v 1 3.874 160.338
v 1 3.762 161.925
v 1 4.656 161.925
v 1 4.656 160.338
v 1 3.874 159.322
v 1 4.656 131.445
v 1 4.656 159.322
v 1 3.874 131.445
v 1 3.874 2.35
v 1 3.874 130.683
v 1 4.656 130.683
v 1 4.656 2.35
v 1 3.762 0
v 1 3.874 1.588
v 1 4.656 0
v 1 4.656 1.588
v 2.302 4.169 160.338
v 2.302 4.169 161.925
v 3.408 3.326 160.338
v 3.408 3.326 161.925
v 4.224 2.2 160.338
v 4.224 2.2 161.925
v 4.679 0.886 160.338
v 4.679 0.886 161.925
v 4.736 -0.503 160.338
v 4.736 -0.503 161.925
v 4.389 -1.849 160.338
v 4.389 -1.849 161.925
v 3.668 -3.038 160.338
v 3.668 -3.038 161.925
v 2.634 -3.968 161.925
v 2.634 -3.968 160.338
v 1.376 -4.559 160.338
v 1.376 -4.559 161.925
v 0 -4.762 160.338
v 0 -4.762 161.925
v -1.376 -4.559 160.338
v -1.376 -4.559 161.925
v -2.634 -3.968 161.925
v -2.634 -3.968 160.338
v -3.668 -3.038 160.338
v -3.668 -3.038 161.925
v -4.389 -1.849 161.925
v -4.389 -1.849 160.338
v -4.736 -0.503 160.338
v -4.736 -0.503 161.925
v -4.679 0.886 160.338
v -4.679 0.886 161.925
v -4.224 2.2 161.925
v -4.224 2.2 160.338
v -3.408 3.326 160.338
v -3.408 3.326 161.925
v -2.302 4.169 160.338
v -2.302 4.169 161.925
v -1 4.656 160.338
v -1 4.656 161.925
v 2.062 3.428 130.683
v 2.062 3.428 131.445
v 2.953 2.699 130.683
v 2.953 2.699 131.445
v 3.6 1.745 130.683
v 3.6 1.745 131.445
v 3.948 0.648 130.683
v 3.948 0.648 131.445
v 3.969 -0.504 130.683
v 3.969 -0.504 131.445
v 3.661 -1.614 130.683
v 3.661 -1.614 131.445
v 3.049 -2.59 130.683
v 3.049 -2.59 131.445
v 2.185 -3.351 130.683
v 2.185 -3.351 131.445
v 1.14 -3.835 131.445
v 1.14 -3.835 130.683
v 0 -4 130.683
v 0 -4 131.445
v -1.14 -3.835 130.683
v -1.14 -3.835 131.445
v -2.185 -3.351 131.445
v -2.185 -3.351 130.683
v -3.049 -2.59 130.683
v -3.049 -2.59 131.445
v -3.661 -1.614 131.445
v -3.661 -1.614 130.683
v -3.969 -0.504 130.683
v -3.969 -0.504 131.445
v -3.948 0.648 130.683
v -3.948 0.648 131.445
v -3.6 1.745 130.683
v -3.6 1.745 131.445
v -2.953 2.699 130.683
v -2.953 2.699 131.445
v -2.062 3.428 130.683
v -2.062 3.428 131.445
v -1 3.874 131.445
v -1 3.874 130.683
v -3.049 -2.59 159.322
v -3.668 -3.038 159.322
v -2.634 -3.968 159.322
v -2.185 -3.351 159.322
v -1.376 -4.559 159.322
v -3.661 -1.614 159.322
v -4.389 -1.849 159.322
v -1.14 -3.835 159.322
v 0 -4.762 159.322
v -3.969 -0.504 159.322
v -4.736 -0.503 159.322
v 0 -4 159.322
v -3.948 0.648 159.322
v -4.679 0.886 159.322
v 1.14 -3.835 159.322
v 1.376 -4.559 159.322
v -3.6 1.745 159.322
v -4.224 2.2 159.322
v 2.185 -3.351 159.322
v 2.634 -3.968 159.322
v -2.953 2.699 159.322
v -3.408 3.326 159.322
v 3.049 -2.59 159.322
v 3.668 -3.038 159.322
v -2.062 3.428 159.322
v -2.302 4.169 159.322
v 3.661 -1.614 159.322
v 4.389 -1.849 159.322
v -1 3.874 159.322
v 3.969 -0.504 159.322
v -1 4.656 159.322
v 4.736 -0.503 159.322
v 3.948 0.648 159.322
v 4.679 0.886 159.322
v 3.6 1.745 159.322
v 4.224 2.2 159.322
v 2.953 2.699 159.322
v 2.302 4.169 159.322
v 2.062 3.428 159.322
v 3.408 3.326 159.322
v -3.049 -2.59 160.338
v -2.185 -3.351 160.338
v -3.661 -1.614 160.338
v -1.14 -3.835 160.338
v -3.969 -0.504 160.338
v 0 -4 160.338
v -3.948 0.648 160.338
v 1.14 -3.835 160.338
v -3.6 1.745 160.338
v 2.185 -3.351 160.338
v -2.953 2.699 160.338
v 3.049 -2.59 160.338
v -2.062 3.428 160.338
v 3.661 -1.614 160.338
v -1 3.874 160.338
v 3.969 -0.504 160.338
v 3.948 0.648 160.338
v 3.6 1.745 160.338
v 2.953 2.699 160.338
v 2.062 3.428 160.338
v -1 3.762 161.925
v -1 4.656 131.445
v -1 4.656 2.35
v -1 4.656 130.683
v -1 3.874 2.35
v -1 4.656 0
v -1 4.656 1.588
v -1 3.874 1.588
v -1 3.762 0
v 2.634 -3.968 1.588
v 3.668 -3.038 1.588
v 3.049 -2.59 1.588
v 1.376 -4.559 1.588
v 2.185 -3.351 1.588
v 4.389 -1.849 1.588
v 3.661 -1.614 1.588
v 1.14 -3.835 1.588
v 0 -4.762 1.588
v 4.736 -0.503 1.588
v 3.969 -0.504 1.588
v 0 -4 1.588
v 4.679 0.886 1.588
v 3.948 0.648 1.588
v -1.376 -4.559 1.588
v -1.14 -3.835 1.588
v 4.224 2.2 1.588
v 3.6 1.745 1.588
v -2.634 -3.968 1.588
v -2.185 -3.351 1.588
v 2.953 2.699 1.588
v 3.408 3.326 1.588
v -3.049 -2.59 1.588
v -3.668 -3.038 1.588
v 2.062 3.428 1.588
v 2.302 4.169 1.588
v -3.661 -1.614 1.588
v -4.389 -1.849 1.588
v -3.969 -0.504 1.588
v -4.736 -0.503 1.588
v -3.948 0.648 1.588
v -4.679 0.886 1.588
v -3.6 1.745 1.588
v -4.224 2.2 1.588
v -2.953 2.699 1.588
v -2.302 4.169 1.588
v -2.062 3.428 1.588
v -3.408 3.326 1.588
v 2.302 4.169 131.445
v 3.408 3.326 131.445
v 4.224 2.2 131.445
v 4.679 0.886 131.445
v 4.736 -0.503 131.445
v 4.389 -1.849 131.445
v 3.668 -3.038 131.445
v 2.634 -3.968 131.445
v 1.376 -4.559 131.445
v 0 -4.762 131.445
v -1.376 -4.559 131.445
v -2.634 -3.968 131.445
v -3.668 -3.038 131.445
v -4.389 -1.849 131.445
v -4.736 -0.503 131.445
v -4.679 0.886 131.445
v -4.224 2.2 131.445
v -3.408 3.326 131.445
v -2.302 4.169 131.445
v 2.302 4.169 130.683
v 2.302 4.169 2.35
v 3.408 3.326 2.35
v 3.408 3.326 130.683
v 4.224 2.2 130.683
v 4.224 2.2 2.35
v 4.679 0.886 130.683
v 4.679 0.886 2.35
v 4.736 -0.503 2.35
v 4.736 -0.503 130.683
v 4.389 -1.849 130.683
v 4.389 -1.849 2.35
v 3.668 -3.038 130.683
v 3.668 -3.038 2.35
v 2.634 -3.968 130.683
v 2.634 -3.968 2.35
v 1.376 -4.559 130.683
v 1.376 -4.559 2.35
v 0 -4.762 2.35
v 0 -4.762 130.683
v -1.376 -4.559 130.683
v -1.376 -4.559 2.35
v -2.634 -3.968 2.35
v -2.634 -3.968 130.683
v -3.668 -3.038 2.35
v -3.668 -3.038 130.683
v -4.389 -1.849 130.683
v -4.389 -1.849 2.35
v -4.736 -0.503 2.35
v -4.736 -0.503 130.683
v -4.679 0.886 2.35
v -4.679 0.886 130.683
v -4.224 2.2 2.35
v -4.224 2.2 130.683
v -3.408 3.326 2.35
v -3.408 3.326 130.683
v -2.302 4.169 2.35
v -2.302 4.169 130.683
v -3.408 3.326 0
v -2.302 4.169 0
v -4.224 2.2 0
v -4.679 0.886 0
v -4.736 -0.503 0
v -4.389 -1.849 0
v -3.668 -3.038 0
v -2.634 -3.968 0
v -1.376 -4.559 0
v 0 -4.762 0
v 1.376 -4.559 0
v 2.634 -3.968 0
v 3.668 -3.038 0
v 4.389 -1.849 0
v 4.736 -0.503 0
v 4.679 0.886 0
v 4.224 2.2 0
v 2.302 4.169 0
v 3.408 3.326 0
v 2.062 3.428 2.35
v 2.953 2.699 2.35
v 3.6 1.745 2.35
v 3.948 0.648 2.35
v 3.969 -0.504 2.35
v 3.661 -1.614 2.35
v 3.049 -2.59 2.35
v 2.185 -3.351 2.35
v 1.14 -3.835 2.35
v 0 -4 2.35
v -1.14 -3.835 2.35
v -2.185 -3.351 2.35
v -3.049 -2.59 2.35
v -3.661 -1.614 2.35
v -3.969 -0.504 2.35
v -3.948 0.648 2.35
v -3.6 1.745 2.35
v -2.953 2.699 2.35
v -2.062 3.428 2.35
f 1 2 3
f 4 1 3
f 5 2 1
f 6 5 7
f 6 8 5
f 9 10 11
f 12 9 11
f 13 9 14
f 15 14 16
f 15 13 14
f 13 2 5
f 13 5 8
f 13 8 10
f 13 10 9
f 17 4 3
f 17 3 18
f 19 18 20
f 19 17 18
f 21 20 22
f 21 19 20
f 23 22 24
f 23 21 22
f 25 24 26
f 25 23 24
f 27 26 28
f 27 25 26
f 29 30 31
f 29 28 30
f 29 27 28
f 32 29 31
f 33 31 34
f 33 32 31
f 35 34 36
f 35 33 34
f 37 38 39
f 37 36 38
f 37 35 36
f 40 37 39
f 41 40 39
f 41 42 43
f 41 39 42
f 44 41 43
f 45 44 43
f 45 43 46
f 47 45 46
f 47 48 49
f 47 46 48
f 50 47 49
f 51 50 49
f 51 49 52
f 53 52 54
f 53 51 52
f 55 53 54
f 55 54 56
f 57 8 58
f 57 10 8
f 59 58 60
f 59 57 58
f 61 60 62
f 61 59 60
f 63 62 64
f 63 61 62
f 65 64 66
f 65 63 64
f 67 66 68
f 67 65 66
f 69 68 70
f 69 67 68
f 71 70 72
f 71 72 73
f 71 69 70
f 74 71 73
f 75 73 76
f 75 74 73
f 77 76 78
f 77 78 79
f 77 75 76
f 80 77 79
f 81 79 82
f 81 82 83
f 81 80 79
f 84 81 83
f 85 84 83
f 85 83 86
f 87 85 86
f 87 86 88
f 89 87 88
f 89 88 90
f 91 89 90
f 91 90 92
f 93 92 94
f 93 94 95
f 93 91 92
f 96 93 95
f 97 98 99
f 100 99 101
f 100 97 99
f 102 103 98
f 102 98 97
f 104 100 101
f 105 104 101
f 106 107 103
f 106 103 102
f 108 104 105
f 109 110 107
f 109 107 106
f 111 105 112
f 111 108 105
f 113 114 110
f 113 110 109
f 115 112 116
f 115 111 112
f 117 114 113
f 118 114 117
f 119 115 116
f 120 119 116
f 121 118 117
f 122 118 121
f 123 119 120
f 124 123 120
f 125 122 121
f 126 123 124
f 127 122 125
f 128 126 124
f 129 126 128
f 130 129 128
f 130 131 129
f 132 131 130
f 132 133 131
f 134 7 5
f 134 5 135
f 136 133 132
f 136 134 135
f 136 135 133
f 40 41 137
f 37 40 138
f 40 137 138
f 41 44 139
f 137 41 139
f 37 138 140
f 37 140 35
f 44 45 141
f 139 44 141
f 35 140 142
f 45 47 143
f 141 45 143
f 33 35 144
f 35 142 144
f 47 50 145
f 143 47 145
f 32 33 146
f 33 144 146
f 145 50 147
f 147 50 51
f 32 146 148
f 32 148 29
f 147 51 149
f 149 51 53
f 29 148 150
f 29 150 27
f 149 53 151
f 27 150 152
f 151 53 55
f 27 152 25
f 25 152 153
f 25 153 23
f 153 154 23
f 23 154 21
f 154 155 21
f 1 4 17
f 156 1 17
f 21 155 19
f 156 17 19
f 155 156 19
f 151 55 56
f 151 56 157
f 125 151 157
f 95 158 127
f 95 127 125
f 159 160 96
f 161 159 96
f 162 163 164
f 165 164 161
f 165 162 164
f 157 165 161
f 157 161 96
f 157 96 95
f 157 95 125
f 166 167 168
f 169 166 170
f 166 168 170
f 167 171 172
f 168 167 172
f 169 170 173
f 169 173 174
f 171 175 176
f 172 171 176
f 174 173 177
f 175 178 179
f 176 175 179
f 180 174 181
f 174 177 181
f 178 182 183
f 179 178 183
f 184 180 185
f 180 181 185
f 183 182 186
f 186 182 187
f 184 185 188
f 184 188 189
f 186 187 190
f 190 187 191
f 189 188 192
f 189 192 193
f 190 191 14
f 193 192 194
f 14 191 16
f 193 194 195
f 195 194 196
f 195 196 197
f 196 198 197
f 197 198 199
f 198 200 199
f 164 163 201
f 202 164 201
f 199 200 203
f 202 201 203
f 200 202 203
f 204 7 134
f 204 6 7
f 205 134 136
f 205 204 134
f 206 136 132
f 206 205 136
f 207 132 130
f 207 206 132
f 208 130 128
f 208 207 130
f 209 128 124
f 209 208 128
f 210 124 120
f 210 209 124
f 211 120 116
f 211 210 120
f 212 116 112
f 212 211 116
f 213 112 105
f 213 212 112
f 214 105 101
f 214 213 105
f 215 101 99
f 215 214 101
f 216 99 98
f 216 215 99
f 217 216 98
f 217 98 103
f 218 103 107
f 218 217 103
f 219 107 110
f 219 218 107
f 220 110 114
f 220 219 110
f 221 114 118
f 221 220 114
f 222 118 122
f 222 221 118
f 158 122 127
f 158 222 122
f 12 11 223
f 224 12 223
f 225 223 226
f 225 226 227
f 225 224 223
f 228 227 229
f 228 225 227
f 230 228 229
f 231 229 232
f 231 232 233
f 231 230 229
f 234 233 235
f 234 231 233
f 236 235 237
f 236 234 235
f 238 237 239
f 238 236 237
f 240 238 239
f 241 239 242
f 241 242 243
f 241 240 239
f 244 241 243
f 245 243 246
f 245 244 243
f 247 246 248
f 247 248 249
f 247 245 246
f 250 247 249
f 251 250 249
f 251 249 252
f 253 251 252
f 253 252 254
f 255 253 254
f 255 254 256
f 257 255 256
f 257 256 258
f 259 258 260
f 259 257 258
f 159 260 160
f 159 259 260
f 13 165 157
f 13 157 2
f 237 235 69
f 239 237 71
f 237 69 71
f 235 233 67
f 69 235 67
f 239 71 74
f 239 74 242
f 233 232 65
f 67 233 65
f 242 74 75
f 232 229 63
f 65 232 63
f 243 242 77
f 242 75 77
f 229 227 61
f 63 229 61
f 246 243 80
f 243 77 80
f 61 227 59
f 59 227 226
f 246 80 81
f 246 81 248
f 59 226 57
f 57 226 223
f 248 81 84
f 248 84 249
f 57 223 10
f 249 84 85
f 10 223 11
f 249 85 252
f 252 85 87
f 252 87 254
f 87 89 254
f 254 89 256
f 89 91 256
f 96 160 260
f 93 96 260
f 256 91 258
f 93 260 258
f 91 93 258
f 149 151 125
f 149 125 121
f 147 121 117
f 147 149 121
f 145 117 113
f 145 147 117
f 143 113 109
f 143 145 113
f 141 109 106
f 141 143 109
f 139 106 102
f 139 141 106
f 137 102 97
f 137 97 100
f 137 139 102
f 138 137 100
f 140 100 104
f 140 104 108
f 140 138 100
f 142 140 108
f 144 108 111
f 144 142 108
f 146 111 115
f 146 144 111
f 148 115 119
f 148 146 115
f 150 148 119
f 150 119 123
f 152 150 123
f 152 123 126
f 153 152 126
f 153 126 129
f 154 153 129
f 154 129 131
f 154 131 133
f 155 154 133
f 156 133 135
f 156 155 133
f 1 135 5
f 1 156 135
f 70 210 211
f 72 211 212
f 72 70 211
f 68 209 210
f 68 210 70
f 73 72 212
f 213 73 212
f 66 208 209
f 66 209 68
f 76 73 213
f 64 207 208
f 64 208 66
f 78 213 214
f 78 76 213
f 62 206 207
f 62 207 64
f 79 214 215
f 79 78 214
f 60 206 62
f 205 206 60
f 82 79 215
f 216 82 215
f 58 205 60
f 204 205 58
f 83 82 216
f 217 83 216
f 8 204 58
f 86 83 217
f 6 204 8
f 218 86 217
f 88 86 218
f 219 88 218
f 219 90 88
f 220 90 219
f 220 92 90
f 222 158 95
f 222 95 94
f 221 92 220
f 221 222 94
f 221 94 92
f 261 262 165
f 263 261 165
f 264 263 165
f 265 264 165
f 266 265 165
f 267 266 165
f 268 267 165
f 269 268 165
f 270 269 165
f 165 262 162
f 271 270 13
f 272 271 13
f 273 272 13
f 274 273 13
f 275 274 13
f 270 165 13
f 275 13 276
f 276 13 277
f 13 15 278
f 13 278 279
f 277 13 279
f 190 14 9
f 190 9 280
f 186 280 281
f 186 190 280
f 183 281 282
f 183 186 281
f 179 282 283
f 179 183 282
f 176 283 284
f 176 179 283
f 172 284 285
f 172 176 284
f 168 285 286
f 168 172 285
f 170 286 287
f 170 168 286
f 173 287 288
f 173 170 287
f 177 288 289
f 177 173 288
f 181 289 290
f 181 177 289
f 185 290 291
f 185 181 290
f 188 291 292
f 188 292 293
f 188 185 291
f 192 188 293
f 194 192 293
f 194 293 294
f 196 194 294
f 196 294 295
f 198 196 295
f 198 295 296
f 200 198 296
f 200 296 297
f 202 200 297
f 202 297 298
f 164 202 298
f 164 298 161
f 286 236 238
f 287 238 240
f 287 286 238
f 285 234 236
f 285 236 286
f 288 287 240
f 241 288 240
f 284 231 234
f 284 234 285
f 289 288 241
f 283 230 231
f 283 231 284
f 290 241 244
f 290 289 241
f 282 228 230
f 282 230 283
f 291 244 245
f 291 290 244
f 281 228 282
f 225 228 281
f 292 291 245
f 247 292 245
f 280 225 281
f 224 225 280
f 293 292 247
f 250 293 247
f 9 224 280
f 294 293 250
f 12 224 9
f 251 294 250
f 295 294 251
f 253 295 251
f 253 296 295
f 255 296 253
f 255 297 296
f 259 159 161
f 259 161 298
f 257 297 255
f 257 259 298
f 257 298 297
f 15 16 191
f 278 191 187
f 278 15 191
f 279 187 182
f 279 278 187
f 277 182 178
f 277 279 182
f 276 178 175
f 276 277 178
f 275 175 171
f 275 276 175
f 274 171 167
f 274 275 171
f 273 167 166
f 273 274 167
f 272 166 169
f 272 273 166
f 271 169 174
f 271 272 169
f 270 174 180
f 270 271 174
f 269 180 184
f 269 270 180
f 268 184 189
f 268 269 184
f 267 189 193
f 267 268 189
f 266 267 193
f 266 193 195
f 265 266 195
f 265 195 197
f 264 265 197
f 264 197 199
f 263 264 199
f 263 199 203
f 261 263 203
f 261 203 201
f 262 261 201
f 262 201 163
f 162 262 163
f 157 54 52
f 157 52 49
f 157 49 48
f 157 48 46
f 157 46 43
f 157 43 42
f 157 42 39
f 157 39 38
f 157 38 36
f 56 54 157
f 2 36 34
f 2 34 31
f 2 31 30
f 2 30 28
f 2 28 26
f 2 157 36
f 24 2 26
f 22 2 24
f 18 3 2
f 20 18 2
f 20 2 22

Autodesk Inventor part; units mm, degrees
sketch "Sketch1" plane through (0, 0, 0) normal (0, 0, 1) x (1, 0, 0)
  arc A0 (-1, 4.6563) -> (1, 4.6563) centre (0, 0) ccw
  line L0 (-1, 3.7625) -> (1, 3.7625)
  line L1 (1, 3.7625) -> (1, 4.6563)
  line L2 (1, 5.7625) -> (-1, 5.7625) construction
  line L3 (-1, 5.7625) -> (-1, 4.6563) construction
  arc A1 (1, 4.6563) -> (-1, 4.6563) centre (0, 0) ccw construction
  line L4 (-1, 4.6563) -> (-1, 3.7625)
  line L5 (1, 4.6563) -> (1, 5.7625) construction
  dimension "d0" = 9.525
  dimension "d3" = 2
  dimension "d4" = 2
  dimension "d5" = 1
  dimension "d6" = 3.7625
extrude "Extrusion1" add sketch "Sketch1" along normal blind 161.925
ref_plane "Work Plane1" through (0, 0, 1.5875) normal (0, 0, -1) x (-1, 0, 0)
sketch "Sketch2" plane through (0, 0, 1.5875) normal (0, 0, -1) x (-1, 0, 0)
  line L0 (-1, 3.7625) -> (-1, 4.6563) projected
  line L1 (1, 3.7625) -> (-1, 3.7625) projected
  line L2 (1, 4.6563) -> (1, 3.7625) projected
  arc A0 (-1, 4.6563) -> (1, 4.6563) centre (0, 0) ccw projected
  arc A1 (-1, 3.8735) -> (1, 3.8735) centre (0, 0) ccw
  arc A2 (1, 3.8735) -> (-1, 3.8735) centre (0, 0) ccw construction
  dimension "d9" = 0.762
extrude "Extrusion2" cut sketch "Sketch2" against normal blind 0.762 contours A1 L2 A0 L0
ref_plane "Work Plane2" through (0, 0, 130.683) normal (0, 0, -1) x (-1, 0, 0)
sketch "Sketch3" plane through (0, 0, 130.683) normal (0, 0, -1) x (-1, 0, 0)
  arc A0 (-1, 3.8735) -> (1, 3.8735) centre (0, 0) ccw projected
  line L0 (-1, 3.7625) -> (-1, 4.6563) projected
  arc A1 (-1, 4.6563) -> (1, 4.6563) centre (0, 0) ccw projected
  line L1 (1, 4.6563) -> (1, 3.7625) projected
  line L2 (1, 3.7625) -> (-1, 3.7625) projected
extrude "Extrusion3" cut sketch "Sketch3" against normal blind 0.762 contours A0 L1 A1 L0
ref_plane "Work Plane3" through (0, 0, 160.3375) normal (0, 0, 1) x (1, 0, 0)
sketch "Sketch4" plane through (0, 0, 160.3375) normal (0, 0, 1) x (1, 0, 0)
  arc A0 (-1, 3.8735) -> (1, 3.8735) centre (0, 0) ccw projected
  line L0 (-1, 3.7625) -> (1, 3.7625) projected
  line L1 (-1, 4.6563) -> (-1, 3.7625) projected
  line L2 (1, 3.7625) -> (1, 4.6563) projected
  arc A1 (-1, 4.6563) -> (1, 4.6563) centre (0, 0) ccw projected
extrude "Extrusion4" cut sketch "Sketch4" against normal blind 1.016 contours A0 L2 A1 L1
equation "\"d4\" = d3"
equation "\"d5\" = 0.5 * d3"
equation "\"d6\" = 0.5 * d0 - 0.5 * d4"
properties part number "vertical drive shaft 2"
